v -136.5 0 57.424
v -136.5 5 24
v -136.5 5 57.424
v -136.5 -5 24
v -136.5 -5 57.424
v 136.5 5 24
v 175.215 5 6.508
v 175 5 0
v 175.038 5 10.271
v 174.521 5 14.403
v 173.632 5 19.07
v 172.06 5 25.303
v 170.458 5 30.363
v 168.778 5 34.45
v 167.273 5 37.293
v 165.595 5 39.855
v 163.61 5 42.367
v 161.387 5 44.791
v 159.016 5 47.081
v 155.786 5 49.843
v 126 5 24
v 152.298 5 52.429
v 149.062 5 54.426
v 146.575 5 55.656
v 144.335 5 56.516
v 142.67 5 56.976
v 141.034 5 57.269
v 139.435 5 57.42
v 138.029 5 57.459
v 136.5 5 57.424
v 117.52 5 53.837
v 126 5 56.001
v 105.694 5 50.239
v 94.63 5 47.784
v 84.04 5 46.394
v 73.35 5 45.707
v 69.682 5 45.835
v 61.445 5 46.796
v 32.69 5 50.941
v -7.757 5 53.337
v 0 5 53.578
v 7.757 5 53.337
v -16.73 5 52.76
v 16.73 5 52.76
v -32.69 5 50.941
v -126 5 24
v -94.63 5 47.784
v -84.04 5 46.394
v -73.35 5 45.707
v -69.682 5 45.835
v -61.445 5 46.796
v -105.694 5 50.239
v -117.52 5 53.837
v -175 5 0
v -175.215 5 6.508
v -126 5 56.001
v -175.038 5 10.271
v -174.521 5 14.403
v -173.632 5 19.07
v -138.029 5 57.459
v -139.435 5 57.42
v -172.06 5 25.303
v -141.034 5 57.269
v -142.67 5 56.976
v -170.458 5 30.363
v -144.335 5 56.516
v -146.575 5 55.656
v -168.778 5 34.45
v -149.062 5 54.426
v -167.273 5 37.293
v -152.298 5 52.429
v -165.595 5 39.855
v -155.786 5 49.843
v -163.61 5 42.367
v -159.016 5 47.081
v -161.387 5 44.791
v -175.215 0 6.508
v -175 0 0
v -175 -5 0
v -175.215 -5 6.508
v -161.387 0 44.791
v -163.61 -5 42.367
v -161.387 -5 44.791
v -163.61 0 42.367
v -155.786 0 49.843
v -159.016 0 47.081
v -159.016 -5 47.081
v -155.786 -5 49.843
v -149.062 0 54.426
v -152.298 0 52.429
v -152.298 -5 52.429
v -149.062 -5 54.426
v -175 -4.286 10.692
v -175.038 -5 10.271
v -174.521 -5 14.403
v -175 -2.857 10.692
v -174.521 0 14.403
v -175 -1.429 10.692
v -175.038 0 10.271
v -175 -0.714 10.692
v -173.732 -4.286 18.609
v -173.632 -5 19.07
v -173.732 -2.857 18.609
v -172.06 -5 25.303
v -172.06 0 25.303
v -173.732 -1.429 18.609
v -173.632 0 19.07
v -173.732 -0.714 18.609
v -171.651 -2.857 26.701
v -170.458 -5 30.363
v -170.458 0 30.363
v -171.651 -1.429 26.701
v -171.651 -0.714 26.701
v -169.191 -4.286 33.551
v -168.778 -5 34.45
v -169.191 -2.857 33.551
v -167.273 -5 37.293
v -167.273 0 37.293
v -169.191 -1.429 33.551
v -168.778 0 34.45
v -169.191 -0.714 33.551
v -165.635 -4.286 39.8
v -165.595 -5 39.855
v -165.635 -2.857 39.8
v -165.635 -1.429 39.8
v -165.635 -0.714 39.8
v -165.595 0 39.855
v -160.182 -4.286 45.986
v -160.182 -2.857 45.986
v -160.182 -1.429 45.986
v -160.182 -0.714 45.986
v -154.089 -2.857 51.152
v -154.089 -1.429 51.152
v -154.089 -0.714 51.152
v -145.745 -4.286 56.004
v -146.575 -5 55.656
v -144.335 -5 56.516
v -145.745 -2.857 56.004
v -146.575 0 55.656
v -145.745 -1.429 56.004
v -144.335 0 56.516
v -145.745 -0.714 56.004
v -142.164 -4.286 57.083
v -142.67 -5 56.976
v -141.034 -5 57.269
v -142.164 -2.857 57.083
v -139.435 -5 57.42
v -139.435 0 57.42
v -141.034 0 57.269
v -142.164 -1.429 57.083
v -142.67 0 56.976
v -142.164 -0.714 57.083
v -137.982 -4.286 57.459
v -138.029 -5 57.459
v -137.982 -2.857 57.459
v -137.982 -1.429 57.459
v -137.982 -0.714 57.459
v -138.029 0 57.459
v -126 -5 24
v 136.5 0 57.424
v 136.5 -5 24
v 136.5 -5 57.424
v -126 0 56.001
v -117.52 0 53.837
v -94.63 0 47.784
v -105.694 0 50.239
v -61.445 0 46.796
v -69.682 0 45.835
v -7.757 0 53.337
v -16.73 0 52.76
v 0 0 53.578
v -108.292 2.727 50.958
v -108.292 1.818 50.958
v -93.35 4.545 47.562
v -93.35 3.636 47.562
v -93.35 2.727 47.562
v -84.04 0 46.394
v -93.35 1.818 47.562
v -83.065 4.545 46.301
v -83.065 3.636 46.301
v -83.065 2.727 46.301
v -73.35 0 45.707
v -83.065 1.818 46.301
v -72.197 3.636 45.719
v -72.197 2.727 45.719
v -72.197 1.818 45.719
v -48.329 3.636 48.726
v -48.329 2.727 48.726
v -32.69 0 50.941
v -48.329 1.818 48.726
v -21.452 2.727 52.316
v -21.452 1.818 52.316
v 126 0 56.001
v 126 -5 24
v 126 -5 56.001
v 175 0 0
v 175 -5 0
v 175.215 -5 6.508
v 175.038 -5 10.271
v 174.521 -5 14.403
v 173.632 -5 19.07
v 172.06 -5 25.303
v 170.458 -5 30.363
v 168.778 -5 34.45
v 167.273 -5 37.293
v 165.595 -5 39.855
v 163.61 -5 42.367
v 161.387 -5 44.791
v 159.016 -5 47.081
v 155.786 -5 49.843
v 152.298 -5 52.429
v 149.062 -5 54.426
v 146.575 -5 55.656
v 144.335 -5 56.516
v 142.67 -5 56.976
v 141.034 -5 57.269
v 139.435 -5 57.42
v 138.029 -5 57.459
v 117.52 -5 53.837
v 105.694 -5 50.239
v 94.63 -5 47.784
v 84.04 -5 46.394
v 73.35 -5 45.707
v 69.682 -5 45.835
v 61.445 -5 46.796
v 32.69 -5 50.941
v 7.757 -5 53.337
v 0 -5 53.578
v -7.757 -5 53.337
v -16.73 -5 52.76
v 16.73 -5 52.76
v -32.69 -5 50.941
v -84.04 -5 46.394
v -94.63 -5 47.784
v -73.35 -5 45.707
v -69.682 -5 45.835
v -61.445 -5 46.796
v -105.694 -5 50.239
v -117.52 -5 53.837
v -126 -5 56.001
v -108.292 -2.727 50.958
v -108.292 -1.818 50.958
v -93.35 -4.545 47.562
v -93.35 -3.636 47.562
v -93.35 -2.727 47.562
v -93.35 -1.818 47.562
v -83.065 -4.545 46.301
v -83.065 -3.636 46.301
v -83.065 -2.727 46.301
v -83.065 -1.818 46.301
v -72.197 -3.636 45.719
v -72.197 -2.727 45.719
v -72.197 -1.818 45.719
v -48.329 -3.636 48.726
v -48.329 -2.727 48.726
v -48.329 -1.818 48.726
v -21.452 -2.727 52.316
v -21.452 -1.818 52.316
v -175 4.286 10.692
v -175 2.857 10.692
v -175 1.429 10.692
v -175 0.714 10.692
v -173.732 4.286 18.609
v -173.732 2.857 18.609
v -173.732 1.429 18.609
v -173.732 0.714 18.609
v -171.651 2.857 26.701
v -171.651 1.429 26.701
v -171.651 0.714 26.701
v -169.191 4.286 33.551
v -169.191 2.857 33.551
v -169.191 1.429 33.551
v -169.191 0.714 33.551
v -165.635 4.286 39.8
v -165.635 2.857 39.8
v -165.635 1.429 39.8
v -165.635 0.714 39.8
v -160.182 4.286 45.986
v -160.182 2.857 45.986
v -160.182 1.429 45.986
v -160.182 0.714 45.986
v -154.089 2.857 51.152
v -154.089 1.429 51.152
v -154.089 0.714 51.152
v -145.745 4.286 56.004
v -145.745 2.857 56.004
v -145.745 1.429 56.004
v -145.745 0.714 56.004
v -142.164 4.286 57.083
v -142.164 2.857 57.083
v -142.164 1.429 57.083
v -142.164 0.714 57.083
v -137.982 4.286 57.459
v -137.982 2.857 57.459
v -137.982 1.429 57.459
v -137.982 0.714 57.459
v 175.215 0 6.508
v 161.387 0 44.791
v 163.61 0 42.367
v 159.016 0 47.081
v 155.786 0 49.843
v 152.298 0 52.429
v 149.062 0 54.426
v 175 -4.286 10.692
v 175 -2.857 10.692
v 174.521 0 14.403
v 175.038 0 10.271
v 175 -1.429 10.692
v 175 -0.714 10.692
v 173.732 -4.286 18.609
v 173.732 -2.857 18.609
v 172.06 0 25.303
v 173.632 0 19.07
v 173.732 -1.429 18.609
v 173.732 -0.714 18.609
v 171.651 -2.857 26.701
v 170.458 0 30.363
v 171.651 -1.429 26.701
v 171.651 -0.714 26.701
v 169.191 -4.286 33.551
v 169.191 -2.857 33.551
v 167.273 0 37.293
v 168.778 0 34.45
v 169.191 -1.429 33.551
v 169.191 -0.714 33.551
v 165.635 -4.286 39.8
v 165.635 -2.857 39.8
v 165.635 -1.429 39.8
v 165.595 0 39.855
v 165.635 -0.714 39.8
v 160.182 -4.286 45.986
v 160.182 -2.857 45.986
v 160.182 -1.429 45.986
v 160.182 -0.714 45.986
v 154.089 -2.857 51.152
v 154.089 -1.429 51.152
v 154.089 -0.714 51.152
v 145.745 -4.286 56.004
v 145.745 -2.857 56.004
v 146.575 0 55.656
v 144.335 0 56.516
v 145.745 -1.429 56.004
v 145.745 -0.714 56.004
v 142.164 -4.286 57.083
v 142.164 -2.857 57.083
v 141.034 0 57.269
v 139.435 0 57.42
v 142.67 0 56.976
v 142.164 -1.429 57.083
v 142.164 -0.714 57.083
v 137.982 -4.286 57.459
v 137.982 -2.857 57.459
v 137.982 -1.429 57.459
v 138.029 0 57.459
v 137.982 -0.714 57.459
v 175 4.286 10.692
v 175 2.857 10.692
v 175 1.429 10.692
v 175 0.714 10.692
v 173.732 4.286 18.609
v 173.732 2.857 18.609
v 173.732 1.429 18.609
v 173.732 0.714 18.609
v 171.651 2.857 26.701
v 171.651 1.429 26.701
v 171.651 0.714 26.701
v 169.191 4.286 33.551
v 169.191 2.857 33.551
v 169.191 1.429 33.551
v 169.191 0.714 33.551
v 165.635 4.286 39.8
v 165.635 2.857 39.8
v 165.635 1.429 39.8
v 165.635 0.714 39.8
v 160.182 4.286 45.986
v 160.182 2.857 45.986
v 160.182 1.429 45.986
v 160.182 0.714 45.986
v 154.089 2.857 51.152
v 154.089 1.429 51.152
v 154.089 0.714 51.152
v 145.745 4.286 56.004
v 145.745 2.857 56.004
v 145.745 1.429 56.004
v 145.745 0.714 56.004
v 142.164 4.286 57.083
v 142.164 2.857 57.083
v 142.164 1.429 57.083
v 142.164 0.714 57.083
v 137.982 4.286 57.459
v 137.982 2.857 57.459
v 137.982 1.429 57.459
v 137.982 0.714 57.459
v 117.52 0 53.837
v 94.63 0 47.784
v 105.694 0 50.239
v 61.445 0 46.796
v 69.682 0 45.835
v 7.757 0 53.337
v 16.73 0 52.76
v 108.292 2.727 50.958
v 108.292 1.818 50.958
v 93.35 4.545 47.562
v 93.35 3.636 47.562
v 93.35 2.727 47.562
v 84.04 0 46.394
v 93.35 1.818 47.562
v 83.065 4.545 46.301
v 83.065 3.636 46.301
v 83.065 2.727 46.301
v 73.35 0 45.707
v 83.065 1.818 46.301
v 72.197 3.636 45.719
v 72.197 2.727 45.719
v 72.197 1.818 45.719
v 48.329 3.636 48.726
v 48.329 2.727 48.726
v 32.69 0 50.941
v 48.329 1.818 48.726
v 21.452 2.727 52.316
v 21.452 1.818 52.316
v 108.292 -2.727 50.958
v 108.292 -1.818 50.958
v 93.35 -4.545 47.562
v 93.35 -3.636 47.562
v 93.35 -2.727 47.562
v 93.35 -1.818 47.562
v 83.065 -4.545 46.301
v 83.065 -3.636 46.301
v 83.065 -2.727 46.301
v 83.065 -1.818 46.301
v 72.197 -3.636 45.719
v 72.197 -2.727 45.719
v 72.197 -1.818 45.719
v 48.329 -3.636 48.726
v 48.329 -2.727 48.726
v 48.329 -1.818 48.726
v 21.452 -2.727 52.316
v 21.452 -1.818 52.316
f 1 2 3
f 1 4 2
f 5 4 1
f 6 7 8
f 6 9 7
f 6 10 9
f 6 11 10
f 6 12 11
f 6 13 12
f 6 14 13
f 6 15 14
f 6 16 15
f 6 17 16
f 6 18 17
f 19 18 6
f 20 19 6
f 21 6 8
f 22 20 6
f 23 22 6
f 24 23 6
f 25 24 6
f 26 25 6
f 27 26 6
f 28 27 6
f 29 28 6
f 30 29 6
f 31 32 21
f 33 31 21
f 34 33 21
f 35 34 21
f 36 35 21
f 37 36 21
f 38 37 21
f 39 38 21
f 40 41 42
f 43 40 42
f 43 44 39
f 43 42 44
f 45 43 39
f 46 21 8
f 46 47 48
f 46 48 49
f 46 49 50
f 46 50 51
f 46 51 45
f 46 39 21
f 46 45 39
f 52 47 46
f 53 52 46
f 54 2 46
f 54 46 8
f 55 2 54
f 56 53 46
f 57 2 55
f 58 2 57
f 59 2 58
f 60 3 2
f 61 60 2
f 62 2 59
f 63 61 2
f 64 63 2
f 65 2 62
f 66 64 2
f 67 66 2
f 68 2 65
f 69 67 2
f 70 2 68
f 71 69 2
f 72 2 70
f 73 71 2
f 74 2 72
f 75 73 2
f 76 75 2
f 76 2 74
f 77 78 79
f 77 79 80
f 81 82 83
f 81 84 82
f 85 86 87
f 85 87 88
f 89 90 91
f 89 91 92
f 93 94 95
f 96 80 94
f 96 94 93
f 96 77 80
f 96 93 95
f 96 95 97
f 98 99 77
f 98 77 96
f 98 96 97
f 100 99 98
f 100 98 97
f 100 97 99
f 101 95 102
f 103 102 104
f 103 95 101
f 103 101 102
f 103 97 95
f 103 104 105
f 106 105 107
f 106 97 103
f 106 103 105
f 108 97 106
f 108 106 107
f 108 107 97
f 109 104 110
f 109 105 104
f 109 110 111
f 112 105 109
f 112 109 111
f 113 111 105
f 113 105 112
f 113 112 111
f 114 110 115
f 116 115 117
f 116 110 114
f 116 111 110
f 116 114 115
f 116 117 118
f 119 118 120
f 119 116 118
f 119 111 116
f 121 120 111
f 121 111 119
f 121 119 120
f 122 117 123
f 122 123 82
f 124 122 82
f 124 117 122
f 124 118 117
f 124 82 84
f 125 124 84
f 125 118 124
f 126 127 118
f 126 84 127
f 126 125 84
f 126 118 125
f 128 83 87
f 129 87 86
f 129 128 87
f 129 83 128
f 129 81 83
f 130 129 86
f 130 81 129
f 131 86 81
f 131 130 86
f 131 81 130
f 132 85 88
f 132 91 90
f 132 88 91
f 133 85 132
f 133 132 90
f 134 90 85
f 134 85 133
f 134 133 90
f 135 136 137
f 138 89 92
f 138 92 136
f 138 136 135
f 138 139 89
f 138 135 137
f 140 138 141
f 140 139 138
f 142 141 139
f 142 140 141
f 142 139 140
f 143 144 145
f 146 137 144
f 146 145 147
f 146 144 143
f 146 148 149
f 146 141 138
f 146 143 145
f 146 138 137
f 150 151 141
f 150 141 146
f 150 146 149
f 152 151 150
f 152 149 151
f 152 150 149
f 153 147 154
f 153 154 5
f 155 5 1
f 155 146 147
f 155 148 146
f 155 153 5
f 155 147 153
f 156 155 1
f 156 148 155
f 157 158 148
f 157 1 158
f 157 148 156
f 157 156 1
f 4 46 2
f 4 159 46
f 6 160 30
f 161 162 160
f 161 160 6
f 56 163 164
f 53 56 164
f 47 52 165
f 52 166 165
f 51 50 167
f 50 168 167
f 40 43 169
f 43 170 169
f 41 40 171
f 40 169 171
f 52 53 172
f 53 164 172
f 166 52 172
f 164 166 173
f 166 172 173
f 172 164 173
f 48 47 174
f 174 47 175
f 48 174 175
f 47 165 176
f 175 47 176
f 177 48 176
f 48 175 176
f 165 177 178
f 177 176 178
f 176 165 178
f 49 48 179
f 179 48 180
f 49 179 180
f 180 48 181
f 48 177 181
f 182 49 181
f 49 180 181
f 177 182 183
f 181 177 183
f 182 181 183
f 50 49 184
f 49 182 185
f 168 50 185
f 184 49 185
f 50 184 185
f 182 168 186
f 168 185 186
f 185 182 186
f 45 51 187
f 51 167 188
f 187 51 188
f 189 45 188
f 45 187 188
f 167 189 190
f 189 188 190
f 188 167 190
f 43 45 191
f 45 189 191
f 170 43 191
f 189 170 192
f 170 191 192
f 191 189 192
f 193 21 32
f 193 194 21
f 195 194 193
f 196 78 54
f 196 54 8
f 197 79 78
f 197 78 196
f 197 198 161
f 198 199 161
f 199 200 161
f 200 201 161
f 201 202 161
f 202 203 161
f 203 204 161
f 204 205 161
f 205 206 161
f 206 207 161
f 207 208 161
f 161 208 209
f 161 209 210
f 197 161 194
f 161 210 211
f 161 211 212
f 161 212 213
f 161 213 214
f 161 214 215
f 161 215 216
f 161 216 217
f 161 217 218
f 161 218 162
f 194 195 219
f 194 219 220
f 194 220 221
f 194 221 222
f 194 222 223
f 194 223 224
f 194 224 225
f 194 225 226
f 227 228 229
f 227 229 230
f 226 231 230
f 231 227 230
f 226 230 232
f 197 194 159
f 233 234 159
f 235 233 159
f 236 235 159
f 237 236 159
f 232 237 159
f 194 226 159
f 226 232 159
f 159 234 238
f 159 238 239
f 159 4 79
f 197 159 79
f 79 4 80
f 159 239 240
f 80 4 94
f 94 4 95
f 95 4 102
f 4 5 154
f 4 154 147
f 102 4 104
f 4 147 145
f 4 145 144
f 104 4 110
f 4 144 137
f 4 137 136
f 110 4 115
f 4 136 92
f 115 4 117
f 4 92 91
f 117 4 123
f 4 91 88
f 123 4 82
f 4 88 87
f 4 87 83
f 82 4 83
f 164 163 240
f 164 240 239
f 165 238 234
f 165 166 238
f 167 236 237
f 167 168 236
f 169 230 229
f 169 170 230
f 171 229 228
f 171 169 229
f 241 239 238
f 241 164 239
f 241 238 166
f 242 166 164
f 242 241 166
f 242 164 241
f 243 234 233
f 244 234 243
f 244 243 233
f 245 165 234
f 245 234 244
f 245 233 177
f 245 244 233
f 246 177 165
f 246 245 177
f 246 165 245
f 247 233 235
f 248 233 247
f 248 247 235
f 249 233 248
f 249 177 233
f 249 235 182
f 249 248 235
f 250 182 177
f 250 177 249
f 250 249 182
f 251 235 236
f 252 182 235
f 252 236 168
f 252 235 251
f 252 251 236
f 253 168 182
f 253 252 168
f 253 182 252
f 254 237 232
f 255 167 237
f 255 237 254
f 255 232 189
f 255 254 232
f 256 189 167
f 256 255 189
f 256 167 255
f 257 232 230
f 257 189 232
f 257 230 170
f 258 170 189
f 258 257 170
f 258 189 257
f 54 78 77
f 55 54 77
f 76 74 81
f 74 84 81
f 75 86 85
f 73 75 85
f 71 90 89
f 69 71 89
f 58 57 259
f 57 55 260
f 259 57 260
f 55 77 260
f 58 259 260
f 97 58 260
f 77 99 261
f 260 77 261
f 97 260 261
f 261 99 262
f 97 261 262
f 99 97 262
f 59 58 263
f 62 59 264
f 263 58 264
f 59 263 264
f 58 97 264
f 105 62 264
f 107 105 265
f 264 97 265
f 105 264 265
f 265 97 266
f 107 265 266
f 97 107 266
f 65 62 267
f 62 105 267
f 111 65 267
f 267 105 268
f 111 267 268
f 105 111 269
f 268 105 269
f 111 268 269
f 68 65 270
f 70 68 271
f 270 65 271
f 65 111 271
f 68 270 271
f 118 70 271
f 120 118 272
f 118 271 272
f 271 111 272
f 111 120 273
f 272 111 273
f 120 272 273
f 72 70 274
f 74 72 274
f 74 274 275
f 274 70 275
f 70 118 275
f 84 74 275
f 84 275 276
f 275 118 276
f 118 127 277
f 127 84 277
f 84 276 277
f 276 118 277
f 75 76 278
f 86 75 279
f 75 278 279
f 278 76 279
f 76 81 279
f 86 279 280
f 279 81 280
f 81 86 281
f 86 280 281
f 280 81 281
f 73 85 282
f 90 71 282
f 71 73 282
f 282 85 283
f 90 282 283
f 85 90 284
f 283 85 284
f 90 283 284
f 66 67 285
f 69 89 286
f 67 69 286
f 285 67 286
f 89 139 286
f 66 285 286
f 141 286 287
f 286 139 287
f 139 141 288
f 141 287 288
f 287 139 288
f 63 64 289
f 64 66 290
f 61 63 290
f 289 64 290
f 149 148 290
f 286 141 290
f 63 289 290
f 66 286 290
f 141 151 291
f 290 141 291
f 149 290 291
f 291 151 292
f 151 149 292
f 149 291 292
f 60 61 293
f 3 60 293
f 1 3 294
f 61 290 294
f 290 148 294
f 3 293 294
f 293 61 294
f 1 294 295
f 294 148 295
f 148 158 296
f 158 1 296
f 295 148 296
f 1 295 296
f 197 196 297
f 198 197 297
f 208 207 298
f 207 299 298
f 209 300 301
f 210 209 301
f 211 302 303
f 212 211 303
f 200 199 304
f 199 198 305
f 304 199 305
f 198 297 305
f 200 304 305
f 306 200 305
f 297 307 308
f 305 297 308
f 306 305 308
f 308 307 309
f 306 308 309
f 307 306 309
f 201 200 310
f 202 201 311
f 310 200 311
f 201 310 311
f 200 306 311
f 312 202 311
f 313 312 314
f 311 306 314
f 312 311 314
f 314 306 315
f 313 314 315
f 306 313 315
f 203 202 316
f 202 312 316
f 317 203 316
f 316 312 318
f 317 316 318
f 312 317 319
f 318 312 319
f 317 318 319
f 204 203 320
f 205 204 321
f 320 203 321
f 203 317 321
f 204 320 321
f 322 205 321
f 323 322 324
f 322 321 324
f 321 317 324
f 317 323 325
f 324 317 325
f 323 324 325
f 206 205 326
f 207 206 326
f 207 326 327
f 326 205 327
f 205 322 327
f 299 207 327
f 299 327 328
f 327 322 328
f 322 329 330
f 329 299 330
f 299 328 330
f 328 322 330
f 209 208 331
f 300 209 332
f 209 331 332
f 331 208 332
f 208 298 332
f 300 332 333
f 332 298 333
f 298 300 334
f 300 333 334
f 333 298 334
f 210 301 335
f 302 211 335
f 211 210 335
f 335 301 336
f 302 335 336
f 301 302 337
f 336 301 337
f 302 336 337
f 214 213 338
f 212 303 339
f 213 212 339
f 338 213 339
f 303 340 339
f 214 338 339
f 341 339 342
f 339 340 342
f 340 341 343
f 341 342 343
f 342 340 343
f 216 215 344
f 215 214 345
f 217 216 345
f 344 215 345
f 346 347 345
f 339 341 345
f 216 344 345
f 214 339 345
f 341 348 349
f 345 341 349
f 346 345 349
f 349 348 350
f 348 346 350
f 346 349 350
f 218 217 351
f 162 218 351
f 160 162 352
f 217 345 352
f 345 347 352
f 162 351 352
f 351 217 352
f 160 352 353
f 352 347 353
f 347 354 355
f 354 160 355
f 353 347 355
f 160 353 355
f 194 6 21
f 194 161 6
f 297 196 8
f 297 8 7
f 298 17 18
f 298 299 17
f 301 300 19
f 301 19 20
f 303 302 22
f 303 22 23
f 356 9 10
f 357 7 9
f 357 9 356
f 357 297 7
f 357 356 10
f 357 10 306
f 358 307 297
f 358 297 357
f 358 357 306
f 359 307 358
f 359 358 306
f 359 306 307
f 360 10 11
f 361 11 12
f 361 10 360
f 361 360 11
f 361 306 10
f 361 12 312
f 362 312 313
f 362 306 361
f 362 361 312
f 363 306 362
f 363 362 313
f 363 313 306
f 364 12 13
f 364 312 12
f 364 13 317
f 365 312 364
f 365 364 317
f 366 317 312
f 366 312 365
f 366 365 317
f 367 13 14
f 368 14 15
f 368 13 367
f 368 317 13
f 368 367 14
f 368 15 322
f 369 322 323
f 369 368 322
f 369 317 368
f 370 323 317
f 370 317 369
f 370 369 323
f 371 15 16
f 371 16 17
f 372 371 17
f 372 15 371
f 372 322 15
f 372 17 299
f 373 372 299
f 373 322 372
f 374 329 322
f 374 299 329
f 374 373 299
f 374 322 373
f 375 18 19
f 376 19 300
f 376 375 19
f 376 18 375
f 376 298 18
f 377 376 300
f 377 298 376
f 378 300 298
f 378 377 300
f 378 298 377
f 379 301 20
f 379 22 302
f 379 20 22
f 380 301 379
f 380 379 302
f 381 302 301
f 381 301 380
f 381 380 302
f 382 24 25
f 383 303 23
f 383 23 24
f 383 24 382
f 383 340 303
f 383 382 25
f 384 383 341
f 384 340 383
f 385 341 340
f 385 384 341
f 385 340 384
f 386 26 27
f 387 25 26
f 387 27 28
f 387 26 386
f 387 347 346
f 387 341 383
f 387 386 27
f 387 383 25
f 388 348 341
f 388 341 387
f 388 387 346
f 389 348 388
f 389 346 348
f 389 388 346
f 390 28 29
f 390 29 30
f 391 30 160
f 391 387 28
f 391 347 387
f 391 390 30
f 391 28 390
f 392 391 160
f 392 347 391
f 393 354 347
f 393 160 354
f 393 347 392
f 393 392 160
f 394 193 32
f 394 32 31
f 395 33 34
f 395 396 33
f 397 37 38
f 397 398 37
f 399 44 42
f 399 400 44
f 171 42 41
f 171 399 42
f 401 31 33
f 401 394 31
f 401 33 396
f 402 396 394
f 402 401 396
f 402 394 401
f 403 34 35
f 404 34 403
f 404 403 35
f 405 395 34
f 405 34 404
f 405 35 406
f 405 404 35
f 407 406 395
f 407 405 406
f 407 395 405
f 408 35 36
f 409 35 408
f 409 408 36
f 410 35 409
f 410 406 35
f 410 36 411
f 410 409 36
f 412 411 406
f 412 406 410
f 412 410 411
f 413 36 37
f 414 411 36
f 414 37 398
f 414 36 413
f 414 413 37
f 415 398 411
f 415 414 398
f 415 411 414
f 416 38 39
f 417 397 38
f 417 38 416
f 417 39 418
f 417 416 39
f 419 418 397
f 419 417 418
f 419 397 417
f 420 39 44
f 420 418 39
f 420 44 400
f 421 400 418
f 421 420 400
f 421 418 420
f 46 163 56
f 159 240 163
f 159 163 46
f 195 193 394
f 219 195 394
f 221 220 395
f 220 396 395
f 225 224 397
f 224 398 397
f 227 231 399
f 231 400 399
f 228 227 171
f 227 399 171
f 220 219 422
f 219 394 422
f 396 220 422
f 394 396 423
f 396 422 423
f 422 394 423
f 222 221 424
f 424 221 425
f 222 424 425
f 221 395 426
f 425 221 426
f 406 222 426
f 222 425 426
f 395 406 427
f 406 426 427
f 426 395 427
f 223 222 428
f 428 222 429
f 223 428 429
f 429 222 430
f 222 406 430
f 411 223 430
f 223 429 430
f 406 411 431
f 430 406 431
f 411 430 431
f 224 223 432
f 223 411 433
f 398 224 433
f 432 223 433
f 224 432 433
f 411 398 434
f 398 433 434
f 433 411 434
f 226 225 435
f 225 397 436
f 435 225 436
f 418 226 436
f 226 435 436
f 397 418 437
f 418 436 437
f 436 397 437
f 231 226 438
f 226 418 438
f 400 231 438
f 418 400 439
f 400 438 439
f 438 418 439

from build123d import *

# Parameters (mm, degrees)
F1_DEPTH = 5


with BuildPart() as f1:
    # F0 (on Front) → F1 (new body, symmetric)
    with BuildSketch(Plane.XZ):
        with BuildLine():
            add(Edge.make_bspline(
                [(-175, 0), (-175.188673045, 3.351397706), (-175.610707382, 10.8479900742), (-171.9496406387, 27.0806635508), (-166.8051864122, 40.1985055158), (-154.5461010079, 51.4071622955), (-145.8965516954, 56.3691980075), (-140.7914483807, 57.537522072), (-137.0120384714, 57.4470390791), (-136.5, 57.4243189561)],
                knots=[0, 0, 0, 0, 0.0543988534, 0.1216823741, 0.1848452702, 0.2517909749, 0.3034780006, 0.3502313349, 0.3572812312, 0.3572812312, 0.3572812312, 0.3572812312], degree=3))
            Line((-175, 0), (175, 0))
            add(Edge.make_bspline(
                [(175, 0), (175.188673045, 3.351397706), (175.610707382, 10.8479900742), (171.9496406387, 27.0806635508), (166.8051864122, 40.1985055158), (154.5461010079, 51.4071622955), (145.8965516954, 56.3691980075), (140.7914483807, 57.537522072), (137.0120384714, 57.4470390791), (136.5, 57.4243189561)],
                knots=[0, 0, 0, 0, 0.0543988534, 0.1216823741, 0.1848452702, 0.2517909749, 0.3034780006, 0.3502313349, 0.3572812312, 0.3572812312, 0.3572812312, 0.3572812312], degree=3))
            Line((136.5, 57.4243189561), (136.5, 24))
            Line((136.5, 24), (126, 24))
            Line((126, 24), (126, 56.0013009423))
            add(Edge.make_bspline(
                [(126, 56.0013009423), (124.5541483871, 55.7054349891), (117.9690685875, 54.1920327425), (108.7801784568, 50.7466012387), (93.3847968667, 47.3123085388), (83.2375200687, 46.3002820803), (72.0517797856, 45.2951236), (60.836509294, 46.8641725504), (48.196586284, 48.7594985748), (36.1154087388, 50.4903707353), (21.5902138007, 52.4468689764), (9.0439454159, 53.3623544266), (2.8297087613, 53.5104309658), (0, 53.5778589547)],
                knots=[0.400350912, 0.400350912, 0.400350912, 0.400350912, 0.4175725687, 0.4800193127, 0.5451438854, 0.598697673, 0.6535805236, 0.7097817025, 0.7689571176, 0.8274220088, 0.8913528467, 0.9505265379, 1, 1, 1, 1], degree=3))
            add(Edge.make_bspline(
                [(-126, 56.0013009423), (-124.5541483871, 55.7054349891), (-117.9690685875, 54.1920327425), (-108.7801784568, 50.7466012387), (-93.3847968667, 47.3123085388), (-83.2375200687, 46.3002820803), (-72.0517797856, 45.2951236), (-60.836509294, 46.8641725504), (-48.196586284, 48.7594985748), (-36.1154087388, 50.4903707353), (-21.5902138007, 52.4468689764), (-9.0439454159, 53.3623544266), (-2.8297087613, 53.5104309658), (0, 53.5778589547)],
                knots=[0.400350912, 0.400350912, 0.400350912, 0.400350912, 0.4175725687, 0.4800193127, 0.5451438854, 0.598697673, 0.6535805236, 0.7097817025, 0.7689571176, 0.8274220088, 0.8913528467, 0.9505265379, 1, 1, 1, 1], degree=3))
            Line((-126, 56.0013009423), (-126, 24))
            Line((-126, 24), (-136.5, 24))
            Line((-136.5, 24), (-136.5, 57.4243189561))
        make_face()
    extrude(amount=F1_DEPTH, both=True)


solid = f1.part
